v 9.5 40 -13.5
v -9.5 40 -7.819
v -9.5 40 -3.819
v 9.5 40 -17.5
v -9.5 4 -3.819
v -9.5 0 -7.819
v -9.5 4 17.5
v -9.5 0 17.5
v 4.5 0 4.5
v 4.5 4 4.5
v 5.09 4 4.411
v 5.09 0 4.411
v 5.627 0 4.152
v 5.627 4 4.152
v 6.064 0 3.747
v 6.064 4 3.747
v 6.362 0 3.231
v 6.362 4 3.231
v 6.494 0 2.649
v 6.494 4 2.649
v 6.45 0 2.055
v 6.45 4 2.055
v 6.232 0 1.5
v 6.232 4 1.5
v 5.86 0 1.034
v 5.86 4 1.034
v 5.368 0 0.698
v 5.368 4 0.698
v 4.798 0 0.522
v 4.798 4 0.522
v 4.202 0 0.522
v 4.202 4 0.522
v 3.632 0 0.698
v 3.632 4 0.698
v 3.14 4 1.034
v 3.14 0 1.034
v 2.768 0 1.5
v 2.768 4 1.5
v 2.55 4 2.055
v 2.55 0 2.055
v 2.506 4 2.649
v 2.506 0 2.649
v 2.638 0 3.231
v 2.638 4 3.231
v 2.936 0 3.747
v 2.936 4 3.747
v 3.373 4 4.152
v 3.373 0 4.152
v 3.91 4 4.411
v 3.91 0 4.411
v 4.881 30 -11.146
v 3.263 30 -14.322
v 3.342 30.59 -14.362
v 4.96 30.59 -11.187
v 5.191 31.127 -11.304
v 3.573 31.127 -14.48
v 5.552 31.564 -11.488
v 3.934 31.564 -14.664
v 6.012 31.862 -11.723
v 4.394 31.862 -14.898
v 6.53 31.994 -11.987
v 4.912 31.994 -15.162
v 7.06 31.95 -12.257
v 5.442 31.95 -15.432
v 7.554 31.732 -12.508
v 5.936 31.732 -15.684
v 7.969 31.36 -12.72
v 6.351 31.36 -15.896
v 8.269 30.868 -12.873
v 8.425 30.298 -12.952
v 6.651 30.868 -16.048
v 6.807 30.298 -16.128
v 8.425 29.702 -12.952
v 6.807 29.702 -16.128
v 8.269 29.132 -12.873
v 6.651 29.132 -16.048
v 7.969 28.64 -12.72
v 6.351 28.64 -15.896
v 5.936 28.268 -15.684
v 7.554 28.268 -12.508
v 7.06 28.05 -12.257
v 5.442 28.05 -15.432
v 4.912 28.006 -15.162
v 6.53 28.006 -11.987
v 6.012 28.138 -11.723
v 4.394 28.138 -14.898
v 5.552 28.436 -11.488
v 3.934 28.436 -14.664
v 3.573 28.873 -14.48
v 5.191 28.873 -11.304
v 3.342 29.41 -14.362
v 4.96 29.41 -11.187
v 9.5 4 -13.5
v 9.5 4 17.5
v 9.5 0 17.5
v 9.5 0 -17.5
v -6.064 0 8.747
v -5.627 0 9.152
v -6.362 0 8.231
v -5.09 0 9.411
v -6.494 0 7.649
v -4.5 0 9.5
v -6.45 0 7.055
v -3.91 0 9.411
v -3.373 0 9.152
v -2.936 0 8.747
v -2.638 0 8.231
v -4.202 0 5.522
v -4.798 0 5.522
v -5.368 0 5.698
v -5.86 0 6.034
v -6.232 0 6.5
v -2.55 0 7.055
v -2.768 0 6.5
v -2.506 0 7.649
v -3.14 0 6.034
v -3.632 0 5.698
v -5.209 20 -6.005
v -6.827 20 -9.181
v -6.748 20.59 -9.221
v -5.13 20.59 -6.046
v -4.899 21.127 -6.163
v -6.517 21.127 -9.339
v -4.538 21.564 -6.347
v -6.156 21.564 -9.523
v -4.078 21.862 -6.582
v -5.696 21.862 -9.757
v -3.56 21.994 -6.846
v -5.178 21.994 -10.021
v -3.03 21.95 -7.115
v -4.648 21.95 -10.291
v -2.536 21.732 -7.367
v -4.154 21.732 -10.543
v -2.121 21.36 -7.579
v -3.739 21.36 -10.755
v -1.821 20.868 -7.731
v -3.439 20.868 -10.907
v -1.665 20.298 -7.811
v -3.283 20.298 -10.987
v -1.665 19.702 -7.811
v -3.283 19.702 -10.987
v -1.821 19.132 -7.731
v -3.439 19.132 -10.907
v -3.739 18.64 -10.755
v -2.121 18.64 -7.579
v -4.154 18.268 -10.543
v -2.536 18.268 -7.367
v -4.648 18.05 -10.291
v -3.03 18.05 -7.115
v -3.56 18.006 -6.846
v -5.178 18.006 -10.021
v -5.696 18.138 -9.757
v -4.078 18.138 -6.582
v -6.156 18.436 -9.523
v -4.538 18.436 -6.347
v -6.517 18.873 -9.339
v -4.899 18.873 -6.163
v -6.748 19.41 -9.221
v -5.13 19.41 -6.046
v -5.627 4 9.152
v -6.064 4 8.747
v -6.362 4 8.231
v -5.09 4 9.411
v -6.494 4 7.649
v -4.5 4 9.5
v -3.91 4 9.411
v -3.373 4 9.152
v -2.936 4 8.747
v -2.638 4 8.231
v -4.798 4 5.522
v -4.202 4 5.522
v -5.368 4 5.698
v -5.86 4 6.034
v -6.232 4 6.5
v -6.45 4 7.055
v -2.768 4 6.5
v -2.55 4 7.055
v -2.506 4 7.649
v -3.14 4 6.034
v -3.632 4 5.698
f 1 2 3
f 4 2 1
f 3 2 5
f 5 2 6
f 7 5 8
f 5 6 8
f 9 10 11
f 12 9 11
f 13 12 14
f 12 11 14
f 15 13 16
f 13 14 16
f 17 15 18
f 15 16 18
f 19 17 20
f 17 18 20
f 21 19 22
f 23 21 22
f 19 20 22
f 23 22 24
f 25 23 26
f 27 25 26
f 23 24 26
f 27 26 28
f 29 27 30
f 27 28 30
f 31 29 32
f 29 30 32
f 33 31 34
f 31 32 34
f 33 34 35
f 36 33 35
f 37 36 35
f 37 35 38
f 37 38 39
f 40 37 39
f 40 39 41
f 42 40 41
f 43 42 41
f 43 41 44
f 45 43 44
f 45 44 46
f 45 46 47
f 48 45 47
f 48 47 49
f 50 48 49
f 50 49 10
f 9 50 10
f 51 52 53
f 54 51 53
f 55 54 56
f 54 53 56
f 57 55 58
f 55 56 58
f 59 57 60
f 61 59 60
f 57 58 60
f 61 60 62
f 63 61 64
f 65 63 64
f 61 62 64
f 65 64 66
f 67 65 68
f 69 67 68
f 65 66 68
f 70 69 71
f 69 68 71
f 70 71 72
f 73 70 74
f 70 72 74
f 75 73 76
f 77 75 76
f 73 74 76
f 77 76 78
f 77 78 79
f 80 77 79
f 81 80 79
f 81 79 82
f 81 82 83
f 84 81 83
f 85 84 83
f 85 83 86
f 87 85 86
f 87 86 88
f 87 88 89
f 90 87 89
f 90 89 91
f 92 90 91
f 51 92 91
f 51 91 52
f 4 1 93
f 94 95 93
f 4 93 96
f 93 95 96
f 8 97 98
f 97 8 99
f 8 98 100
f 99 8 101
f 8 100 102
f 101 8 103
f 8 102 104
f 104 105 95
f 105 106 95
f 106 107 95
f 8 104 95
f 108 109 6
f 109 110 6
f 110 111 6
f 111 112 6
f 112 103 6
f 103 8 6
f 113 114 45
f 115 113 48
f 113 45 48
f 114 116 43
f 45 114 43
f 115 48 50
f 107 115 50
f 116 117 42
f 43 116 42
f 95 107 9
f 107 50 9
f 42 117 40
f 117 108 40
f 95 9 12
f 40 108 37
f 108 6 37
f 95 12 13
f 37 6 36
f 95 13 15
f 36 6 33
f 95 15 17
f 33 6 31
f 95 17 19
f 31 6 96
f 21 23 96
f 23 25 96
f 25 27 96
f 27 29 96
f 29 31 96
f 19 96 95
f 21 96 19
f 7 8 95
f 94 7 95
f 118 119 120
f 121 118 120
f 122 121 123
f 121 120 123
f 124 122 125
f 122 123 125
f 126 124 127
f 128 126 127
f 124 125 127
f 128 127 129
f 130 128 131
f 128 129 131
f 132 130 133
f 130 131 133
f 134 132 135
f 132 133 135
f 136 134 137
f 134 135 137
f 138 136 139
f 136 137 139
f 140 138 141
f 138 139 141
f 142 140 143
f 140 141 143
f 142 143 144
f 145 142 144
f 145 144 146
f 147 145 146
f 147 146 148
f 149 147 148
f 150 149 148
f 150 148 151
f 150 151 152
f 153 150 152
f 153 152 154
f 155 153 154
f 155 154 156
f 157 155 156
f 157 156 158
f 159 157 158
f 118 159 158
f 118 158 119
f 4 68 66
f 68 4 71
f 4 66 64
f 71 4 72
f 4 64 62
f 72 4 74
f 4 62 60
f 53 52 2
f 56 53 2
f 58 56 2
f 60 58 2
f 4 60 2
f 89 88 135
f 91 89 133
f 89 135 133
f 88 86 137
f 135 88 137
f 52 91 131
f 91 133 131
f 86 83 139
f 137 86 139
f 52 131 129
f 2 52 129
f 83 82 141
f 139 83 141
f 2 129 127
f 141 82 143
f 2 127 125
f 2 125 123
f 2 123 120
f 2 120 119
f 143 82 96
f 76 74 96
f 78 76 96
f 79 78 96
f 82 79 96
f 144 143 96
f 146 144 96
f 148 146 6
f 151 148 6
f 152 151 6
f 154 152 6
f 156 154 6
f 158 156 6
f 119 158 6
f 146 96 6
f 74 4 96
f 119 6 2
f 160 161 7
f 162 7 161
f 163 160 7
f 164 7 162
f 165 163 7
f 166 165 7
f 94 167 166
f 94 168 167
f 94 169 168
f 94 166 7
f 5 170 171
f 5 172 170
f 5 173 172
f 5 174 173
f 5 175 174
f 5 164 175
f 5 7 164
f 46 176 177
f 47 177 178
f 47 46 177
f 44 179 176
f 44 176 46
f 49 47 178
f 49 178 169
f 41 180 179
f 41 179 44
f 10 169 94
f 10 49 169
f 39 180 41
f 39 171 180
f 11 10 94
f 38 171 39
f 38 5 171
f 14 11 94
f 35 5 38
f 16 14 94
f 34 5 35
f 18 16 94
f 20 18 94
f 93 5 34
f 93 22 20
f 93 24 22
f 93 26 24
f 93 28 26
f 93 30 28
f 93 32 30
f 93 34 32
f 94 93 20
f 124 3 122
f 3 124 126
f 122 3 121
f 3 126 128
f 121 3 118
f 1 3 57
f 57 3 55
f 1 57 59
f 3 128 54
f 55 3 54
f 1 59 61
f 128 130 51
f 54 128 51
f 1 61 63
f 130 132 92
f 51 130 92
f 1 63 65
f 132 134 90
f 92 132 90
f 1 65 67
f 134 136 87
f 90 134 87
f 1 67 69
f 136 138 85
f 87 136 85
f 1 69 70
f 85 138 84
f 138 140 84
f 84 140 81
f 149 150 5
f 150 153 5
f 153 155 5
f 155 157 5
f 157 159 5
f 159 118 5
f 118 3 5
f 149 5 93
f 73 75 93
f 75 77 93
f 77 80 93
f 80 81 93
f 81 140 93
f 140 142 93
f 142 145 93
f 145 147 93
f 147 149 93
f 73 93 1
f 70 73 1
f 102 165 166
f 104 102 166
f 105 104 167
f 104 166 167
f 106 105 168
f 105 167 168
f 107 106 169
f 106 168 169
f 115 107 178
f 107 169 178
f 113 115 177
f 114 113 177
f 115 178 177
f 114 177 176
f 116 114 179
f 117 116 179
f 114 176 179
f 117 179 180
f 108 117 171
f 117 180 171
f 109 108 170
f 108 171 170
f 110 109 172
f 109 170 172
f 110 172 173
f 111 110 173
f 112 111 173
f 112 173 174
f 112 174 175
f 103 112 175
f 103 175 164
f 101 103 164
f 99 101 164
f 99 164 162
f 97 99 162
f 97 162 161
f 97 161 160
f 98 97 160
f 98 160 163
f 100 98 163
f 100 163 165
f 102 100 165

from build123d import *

# Parameters (mm, degrees)
SKETCH1_W           = 19
SKETCH1_H           = 35
BOSS_EXTRUDE1_DEPTH = 4
CUT_EXTRUDE1_DEPTH  = 21.310096012
BOSS_EXTRUDE2_DEPTH = 36
SKETCH4_R           = 2
CUT_EXTRUDE2_DEPTH  = 51.72266342
SKETCH5_R           = 2
CUT_EXTRUDE3_DEPTH  = 42.140004861


with BuildPart() as part:
    # Sketch1 → Boss-Extrude1 (new body)
    with BuildSketch(Plane(origin=(0, 0, 0), x_dir=(1, 0, 0), z_dir=(0, 1, 0))):
        Rectangle(SKETCH1_W, SKETCH1_H)
    extrude(amount=BOSS_EXTRUDE1_DEPTH)

    # Sketch2 → Cut-Extrude1 (cut, through all)
    with BuildSketch(Plane(origin=(0, 4, 0), x_dir=(1, 0, 0), z_dir=(0, 1, 0))):
        Polygon((9.5, 17.5), (-9.5, 7.81901646), (-9.5, 17.5), align=None)
    extrude(amount=-CUT_EXTRUDE1_DEPTH, mode=Mode.SUBTRACT)

    # Sketch3 → Boss-Extrude2 (add)
    with BuildSketch(Plane(origin=(0, 4, 0), x_dir=(1, 0, 0), z_dir=(0, 1, 0))):
        Polygon((9.5, 17.5), (-9.5, 7.81901646), (-9.5, 3.81901646), (9.5, 13.5), align=None)
    extrude(amount=BOSS_EXTRUDE2_DEPTH)

    # Sketch4 → Cut-Extrude2 (cut, through all)
    with BuildSketch(Plane(origin=(-5.120878649, 0, -10.050290234), x_dir=(-0.8910065241883689, 0, 0.45399049973954486), z_dir=(-0.4539904997395449, 0, -0.891006524188369))):
        with Locations((-11.409395725, 30)):
            Circle(SKETCH4_R)
        with Locations((-0.08519721, 20)):
            Circle(SKETCH4_R)
    extrude(amount=-CUT_EXTRUDE2_DEPTH, mode=Mode.SUBTRACT)

    # Sketch5 → Cut-Extrude3 (cut, through all)
    with BuildSketch(Plane(origin=(0, 4, 0), x_dir=(1, 0, 0), z_dir=(0, 1, 0))):
        with Locations(Location((-4.5, -7.5, 0), (0, 0, 270))):
            Circle(SKETCH5_R)
        with Locations(Location((4.5, -2.5, 0), (0, 0, 270))):
            Circle(SKETCH5_R)
    extrude(amount=-CUT_EXTRUDE3_DEPTH, mode=Mode.SUBTRACT)


solid = part.part
